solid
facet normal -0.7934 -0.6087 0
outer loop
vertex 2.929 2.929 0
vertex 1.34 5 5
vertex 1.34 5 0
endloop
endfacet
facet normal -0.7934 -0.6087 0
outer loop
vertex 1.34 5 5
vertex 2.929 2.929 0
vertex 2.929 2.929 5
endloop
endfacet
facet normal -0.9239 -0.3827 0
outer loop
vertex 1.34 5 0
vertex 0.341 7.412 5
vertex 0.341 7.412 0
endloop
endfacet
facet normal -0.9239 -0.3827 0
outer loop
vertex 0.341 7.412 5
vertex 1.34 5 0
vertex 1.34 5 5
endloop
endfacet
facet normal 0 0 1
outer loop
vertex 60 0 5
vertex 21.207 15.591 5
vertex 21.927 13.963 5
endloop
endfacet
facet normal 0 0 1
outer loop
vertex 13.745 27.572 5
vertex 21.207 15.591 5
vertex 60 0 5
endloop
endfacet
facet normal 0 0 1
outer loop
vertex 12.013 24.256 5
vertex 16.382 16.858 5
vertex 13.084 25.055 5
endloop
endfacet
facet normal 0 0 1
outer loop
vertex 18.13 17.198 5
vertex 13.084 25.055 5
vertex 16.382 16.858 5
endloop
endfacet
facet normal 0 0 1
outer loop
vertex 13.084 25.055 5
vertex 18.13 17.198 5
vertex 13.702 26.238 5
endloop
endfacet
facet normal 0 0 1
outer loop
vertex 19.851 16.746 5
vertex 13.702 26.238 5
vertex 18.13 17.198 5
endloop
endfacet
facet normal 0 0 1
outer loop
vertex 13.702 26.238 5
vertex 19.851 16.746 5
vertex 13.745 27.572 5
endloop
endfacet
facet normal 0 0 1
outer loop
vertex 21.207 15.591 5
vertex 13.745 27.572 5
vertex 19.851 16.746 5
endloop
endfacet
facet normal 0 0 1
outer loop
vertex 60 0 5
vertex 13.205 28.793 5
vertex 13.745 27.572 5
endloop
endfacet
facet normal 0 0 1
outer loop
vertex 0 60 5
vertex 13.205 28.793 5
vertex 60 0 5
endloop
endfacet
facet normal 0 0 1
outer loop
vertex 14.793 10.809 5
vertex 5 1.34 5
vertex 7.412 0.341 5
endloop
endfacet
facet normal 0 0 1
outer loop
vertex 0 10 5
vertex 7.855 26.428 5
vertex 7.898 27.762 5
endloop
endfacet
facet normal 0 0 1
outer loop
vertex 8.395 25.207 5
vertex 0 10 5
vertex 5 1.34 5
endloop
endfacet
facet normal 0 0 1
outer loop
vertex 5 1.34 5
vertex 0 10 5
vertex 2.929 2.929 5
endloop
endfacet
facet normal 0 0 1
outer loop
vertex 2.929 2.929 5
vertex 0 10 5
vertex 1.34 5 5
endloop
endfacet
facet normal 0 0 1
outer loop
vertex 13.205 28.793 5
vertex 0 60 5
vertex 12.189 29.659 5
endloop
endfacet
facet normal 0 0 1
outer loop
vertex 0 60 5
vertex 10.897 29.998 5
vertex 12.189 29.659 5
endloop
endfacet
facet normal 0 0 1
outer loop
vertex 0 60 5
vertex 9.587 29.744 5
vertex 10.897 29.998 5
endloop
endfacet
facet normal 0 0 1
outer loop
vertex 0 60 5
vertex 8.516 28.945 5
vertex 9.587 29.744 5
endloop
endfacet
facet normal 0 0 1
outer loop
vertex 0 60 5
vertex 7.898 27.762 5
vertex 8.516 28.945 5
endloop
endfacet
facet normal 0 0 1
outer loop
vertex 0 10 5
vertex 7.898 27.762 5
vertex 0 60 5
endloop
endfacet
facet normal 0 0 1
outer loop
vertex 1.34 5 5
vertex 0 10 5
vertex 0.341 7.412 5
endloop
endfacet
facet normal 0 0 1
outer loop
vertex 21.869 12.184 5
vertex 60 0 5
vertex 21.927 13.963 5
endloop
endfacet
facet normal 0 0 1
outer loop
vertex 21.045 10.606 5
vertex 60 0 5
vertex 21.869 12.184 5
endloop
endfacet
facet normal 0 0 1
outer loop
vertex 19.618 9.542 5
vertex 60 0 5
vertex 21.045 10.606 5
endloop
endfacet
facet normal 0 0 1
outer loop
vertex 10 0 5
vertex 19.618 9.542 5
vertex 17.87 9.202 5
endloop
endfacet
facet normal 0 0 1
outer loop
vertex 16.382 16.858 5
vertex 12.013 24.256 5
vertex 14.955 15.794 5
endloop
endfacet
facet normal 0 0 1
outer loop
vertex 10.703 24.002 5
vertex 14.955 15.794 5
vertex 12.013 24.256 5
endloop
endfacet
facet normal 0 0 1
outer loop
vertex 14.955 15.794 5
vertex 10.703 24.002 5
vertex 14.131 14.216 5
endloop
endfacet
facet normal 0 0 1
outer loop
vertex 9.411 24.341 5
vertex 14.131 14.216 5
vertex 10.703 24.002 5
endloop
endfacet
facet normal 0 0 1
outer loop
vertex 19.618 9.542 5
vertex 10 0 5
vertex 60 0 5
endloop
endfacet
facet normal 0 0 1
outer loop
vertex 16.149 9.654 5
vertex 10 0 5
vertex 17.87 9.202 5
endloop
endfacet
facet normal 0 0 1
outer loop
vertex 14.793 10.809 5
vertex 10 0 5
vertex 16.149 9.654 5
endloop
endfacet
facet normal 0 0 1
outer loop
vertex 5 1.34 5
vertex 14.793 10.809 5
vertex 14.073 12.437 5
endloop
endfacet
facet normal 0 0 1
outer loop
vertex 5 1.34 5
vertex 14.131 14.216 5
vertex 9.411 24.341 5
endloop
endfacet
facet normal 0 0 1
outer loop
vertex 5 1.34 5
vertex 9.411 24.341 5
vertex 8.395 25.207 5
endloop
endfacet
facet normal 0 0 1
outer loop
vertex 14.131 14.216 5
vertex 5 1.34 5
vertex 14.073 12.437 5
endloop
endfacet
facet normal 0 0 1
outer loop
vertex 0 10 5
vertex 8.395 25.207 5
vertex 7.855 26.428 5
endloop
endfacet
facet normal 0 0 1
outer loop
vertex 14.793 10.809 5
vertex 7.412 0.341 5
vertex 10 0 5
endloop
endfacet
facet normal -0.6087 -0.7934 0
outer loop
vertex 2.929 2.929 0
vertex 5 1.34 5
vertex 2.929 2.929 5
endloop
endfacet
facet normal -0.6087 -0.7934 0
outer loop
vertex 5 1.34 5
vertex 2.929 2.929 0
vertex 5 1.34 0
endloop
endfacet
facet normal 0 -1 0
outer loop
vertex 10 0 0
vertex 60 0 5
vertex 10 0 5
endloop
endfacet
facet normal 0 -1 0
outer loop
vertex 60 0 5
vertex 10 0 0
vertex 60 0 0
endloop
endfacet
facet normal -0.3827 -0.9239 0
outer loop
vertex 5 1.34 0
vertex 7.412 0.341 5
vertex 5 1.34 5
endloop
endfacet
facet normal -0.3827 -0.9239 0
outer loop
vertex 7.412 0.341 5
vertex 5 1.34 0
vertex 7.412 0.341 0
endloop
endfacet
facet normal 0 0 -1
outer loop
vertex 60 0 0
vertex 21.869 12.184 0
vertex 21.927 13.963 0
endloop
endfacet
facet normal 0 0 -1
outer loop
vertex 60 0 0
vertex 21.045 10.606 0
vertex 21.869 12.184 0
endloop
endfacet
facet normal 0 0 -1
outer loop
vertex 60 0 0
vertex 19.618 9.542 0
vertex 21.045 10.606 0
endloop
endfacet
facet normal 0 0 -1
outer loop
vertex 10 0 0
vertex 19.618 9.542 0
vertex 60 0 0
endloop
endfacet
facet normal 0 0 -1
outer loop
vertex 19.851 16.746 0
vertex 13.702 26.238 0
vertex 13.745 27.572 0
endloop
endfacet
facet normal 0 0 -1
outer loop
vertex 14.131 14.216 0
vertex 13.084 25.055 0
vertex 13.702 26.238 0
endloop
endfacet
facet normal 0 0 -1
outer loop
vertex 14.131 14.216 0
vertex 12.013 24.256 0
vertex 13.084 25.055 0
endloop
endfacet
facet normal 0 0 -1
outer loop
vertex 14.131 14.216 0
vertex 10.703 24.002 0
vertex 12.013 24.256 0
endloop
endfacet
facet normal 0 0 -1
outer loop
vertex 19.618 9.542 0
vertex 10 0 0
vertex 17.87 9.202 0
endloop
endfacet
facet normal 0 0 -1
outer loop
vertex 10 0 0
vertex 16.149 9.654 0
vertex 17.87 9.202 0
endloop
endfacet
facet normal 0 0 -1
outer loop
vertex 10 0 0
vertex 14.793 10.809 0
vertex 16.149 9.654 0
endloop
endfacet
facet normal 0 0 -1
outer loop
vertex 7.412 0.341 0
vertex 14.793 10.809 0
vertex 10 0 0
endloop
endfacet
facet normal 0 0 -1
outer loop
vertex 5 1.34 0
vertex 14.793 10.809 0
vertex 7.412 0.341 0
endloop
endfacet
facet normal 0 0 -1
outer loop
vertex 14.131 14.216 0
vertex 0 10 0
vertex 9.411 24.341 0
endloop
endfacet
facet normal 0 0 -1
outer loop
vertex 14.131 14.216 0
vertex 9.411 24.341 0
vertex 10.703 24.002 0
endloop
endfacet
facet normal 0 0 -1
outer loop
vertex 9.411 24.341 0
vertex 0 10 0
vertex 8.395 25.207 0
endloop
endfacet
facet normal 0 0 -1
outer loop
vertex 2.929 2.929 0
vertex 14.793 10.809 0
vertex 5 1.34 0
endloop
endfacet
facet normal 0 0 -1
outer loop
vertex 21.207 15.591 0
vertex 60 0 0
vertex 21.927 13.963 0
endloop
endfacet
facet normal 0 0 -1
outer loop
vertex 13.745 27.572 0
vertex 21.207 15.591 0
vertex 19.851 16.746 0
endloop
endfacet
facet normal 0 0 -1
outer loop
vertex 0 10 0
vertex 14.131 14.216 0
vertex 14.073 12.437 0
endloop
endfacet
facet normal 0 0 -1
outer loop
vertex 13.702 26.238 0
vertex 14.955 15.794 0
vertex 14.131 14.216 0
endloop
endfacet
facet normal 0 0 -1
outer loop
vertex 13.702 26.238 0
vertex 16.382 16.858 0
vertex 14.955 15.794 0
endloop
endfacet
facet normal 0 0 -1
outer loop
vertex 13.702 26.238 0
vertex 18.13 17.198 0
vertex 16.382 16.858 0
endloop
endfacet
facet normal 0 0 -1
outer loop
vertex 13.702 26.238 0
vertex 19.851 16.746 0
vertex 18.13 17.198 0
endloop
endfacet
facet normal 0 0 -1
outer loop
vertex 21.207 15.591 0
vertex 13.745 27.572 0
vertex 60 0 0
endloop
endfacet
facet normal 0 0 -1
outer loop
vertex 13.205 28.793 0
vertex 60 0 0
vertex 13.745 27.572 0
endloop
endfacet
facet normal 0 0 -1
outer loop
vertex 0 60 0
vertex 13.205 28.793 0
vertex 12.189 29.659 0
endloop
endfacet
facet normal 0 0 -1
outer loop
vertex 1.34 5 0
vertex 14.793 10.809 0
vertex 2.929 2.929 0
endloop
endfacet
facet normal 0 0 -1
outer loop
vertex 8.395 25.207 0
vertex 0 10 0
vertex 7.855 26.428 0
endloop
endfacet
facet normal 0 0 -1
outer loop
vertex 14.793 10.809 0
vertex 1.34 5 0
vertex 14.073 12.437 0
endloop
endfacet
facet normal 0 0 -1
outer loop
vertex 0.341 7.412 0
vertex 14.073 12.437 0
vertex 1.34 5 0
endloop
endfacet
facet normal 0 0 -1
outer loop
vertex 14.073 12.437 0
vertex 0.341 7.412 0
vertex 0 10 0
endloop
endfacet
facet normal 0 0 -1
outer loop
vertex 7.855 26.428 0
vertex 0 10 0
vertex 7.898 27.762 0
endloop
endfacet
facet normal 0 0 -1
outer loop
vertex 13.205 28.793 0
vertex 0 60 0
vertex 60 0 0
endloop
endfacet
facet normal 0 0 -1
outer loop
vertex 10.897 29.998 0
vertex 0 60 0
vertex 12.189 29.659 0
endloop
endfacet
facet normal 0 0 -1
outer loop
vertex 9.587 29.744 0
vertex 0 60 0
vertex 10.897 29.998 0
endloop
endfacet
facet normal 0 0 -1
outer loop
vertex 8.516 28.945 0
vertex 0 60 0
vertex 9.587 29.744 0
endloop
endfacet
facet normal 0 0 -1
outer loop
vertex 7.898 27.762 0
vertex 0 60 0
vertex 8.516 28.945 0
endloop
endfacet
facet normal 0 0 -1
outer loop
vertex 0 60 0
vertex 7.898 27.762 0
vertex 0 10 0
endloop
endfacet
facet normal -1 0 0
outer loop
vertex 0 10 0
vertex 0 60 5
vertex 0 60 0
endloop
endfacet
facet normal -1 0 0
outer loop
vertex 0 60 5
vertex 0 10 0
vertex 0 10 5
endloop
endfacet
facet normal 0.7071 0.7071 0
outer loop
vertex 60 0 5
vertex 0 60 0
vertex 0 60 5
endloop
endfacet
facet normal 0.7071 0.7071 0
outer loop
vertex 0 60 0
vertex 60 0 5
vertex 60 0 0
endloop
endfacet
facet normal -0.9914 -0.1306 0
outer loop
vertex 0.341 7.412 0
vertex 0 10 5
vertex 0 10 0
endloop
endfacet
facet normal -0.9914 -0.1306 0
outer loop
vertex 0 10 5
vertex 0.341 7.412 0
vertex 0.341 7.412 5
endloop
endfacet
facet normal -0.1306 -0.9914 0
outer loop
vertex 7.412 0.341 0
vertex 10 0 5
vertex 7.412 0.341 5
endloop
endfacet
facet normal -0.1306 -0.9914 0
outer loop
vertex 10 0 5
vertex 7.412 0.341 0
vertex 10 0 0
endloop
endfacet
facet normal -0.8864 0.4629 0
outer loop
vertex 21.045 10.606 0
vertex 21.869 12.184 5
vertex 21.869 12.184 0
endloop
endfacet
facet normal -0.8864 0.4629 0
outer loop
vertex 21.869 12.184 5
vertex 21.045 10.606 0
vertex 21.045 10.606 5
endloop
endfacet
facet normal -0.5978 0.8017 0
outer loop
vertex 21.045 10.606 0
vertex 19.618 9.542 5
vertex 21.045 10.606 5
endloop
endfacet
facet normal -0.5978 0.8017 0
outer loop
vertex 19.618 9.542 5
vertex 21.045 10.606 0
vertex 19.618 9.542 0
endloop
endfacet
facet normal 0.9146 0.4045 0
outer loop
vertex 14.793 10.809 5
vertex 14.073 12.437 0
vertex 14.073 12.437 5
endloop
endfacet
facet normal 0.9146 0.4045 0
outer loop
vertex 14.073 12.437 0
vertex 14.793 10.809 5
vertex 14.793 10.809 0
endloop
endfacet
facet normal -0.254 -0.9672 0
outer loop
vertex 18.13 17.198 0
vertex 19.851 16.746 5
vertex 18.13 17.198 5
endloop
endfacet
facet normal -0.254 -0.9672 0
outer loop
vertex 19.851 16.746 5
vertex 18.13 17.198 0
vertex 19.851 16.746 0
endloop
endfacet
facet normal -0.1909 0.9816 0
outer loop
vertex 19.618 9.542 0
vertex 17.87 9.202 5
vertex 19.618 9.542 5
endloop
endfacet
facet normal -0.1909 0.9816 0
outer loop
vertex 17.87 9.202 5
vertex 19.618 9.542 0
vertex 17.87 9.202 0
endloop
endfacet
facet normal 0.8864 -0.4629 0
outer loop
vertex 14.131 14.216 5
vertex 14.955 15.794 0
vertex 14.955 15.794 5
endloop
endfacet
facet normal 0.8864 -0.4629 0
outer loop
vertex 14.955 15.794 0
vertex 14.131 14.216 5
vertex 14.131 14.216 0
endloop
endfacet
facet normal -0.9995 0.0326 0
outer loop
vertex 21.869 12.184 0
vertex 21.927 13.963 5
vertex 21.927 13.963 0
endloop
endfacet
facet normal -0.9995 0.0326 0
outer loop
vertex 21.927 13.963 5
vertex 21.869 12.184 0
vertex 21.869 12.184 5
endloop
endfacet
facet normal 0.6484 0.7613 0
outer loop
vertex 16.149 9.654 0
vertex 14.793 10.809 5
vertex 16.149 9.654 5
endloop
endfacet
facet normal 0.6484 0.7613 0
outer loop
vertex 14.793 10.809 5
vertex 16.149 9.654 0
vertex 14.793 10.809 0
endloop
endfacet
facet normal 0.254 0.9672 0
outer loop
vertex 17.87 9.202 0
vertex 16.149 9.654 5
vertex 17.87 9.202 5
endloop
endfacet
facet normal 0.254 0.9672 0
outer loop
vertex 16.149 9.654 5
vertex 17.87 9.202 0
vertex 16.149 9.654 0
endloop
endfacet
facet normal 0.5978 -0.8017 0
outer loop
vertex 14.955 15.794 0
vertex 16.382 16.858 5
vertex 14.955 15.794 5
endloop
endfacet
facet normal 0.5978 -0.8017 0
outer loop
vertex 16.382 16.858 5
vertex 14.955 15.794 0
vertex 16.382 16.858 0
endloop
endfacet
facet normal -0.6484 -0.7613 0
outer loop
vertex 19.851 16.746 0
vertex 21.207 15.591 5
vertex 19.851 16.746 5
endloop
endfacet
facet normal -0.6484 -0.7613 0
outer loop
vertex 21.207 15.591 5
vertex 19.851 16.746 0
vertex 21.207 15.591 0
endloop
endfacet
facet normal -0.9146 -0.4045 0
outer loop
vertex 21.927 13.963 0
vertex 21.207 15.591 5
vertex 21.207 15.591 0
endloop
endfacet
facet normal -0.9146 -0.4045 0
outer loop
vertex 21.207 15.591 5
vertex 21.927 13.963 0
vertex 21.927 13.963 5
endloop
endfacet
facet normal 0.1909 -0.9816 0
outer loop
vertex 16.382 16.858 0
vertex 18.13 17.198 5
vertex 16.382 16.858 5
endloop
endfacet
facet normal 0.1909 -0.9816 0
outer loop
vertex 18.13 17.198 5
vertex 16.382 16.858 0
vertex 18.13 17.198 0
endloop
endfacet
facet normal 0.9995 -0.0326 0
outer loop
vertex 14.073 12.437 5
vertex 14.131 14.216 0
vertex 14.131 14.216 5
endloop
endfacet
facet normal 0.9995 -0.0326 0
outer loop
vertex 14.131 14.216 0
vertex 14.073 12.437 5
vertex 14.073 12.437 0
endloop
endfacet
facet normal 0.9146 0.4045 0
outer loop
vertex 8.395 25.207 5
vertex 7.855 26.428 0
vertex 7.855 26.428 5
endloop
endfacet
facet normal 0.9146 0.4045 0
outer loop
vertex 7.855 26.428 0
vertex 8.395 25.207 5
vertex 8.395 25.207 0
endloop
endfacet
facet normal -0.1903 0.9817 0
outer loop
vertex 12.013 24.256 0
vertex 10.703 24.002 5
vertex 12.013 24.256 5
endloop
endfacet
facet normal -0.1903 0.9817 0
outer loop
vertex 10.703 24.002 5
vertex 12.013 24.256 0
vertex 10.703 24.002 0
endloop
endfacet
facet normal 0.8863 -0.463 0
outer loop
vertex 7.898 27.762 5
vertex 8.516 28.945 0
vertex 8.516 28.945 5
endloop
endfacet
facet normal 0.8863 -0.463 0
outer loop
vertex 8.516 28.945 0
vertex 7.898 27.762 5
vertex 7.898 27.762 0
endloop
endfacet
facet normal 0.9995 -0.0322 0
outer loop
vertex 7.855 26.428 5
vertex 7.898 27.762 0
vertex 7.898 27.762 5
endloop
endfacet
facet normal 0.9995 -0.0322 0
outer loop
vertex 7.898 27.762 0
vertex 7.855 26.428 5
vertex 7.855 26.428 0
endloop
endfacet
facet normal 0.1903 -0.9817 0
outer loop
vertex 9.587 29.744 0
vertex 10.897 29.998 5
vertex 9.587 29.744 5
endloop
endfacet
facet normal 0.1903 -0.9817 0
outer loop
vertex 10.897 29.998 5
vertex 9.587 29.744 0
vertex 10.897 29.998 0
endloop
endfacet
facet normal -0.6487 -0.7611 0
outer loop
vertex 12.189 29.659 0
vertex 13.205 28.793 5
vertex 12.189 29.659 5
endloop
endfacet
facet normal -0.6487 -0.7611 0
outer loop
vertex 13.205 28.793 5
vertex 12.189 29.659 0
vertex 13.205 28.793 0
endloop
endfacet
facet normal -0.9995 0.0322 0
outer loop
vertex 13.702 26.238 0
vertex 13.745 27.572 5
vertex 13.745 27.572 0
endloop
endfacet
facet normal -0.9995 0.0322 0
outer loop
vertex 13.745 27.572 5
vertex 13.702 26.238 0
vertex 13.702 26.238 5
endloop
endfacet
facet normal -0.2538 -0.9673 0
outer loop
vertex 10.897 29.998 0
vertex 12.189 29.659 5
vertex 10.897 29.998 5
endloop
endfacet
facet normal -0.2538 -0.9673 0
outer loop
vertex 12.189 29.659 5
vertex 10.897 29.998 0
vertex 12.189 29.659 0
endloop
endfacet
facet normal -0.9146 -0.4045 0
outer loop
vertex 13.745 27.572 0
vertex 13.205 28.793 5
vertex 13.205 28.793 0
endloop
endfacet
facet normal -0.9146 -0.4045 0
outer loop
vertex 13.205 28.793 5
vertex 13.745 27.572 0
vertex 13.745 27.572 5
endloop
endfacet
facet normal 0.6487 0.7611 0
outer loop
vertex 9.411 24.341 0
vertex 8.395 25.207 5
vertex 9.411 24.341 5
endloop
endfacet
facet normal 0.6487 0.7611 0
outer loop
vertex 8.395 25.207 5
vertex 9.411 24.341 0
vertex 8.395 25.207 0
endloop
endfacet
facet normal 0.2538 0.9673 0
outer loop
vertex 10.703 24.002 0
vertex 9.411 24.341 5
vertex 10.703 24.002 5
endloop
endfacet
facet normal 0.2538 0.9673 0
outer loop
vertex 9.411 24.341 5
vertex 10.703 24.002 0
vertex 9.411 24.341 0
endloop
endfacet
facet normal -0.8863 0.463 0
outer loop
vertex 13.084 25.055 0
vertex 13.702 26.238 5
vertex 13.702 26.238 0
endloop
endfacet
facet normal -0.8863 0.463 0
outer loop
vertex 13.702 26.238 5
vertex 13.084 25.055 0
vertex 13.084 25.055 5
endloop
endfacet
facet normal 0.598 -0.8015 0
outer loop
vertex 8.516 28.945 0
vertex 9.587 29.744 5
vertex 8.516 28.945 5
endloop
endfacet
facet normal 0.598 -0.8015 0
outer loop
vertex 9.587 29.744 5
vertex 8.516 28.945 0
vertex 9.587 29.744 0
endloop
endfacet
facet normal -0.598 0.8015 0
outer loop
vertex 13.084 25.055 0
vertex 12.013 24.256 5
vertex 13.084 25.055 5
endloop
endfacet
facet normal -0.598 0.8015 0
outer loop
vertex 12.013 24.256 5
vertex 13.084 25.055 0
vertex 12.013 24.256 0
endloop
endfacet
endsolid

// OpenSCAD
$fn = 32;

// ----------------------------------------------------------------------
// Bracket plate: corner pad 60 x 60, fillet R10
// ----------------------------------------------------------------------

// --- parameters (mm) ---
hole_r = 3;               // bolt hole radius
plate_t = 5;              // plate thickness, Z (extrusion height)
leg_a = 60;               // base leg
leg_b = 60;               // height leg
fillet_r = 10;            // right-angle fillet radius

hole_d1 = 2 * hole_r + 2;
hole_d2 = 2 * hole_r;

profile = [[10, 0], [60, 0], [0, 60], [0, 10], [0.341, 7.412], [1.34, 5], [2.929, 2.929], [5, 1.34], [7.412, 0.341]];  // primary outline, 9 points, counter clockwise
void_1 = [[21.927, 13.963], [21.207, 15.591], [19.851, 16.746], [18.13, 17.198], [16.382, 16.858], [14.955, 15.794], [14.131, 14.216], [14.073, 12.437], [14.793, 10.809], [16.149, 9.654], [17.87, 9.202], [19.618, 9.542], [21.045, 10.606], [21.869, 12.184]];  // mount hole 1, 14 points
void_2 = [[13.745, 27.572], [13.205, 28.793], [12.189, 29.659], [10.897, 29.998], [9.587, 29.744], [8.516, 28.945], [7.898, 27.762], [7.855, 26.428], [8.395, 25.207], [9.411, 24.341], [10.703, 24.002], [12.013, 24.256], [13.084, 25.055], [13.702, 26.238]];  // mount hole 2, 14 points

// --- the one profile operation ---
difference() {
  linear_extrude(height = plate_t) polygon(points = profile);
  translate([0, 0, -1])
    linear_extrude(height = plate_t + 2) polygon(points = void_1);
  translate([0, 0, -1])
    linear_extrude(height = plate_t + 2) polygon(points = void_2);
}
